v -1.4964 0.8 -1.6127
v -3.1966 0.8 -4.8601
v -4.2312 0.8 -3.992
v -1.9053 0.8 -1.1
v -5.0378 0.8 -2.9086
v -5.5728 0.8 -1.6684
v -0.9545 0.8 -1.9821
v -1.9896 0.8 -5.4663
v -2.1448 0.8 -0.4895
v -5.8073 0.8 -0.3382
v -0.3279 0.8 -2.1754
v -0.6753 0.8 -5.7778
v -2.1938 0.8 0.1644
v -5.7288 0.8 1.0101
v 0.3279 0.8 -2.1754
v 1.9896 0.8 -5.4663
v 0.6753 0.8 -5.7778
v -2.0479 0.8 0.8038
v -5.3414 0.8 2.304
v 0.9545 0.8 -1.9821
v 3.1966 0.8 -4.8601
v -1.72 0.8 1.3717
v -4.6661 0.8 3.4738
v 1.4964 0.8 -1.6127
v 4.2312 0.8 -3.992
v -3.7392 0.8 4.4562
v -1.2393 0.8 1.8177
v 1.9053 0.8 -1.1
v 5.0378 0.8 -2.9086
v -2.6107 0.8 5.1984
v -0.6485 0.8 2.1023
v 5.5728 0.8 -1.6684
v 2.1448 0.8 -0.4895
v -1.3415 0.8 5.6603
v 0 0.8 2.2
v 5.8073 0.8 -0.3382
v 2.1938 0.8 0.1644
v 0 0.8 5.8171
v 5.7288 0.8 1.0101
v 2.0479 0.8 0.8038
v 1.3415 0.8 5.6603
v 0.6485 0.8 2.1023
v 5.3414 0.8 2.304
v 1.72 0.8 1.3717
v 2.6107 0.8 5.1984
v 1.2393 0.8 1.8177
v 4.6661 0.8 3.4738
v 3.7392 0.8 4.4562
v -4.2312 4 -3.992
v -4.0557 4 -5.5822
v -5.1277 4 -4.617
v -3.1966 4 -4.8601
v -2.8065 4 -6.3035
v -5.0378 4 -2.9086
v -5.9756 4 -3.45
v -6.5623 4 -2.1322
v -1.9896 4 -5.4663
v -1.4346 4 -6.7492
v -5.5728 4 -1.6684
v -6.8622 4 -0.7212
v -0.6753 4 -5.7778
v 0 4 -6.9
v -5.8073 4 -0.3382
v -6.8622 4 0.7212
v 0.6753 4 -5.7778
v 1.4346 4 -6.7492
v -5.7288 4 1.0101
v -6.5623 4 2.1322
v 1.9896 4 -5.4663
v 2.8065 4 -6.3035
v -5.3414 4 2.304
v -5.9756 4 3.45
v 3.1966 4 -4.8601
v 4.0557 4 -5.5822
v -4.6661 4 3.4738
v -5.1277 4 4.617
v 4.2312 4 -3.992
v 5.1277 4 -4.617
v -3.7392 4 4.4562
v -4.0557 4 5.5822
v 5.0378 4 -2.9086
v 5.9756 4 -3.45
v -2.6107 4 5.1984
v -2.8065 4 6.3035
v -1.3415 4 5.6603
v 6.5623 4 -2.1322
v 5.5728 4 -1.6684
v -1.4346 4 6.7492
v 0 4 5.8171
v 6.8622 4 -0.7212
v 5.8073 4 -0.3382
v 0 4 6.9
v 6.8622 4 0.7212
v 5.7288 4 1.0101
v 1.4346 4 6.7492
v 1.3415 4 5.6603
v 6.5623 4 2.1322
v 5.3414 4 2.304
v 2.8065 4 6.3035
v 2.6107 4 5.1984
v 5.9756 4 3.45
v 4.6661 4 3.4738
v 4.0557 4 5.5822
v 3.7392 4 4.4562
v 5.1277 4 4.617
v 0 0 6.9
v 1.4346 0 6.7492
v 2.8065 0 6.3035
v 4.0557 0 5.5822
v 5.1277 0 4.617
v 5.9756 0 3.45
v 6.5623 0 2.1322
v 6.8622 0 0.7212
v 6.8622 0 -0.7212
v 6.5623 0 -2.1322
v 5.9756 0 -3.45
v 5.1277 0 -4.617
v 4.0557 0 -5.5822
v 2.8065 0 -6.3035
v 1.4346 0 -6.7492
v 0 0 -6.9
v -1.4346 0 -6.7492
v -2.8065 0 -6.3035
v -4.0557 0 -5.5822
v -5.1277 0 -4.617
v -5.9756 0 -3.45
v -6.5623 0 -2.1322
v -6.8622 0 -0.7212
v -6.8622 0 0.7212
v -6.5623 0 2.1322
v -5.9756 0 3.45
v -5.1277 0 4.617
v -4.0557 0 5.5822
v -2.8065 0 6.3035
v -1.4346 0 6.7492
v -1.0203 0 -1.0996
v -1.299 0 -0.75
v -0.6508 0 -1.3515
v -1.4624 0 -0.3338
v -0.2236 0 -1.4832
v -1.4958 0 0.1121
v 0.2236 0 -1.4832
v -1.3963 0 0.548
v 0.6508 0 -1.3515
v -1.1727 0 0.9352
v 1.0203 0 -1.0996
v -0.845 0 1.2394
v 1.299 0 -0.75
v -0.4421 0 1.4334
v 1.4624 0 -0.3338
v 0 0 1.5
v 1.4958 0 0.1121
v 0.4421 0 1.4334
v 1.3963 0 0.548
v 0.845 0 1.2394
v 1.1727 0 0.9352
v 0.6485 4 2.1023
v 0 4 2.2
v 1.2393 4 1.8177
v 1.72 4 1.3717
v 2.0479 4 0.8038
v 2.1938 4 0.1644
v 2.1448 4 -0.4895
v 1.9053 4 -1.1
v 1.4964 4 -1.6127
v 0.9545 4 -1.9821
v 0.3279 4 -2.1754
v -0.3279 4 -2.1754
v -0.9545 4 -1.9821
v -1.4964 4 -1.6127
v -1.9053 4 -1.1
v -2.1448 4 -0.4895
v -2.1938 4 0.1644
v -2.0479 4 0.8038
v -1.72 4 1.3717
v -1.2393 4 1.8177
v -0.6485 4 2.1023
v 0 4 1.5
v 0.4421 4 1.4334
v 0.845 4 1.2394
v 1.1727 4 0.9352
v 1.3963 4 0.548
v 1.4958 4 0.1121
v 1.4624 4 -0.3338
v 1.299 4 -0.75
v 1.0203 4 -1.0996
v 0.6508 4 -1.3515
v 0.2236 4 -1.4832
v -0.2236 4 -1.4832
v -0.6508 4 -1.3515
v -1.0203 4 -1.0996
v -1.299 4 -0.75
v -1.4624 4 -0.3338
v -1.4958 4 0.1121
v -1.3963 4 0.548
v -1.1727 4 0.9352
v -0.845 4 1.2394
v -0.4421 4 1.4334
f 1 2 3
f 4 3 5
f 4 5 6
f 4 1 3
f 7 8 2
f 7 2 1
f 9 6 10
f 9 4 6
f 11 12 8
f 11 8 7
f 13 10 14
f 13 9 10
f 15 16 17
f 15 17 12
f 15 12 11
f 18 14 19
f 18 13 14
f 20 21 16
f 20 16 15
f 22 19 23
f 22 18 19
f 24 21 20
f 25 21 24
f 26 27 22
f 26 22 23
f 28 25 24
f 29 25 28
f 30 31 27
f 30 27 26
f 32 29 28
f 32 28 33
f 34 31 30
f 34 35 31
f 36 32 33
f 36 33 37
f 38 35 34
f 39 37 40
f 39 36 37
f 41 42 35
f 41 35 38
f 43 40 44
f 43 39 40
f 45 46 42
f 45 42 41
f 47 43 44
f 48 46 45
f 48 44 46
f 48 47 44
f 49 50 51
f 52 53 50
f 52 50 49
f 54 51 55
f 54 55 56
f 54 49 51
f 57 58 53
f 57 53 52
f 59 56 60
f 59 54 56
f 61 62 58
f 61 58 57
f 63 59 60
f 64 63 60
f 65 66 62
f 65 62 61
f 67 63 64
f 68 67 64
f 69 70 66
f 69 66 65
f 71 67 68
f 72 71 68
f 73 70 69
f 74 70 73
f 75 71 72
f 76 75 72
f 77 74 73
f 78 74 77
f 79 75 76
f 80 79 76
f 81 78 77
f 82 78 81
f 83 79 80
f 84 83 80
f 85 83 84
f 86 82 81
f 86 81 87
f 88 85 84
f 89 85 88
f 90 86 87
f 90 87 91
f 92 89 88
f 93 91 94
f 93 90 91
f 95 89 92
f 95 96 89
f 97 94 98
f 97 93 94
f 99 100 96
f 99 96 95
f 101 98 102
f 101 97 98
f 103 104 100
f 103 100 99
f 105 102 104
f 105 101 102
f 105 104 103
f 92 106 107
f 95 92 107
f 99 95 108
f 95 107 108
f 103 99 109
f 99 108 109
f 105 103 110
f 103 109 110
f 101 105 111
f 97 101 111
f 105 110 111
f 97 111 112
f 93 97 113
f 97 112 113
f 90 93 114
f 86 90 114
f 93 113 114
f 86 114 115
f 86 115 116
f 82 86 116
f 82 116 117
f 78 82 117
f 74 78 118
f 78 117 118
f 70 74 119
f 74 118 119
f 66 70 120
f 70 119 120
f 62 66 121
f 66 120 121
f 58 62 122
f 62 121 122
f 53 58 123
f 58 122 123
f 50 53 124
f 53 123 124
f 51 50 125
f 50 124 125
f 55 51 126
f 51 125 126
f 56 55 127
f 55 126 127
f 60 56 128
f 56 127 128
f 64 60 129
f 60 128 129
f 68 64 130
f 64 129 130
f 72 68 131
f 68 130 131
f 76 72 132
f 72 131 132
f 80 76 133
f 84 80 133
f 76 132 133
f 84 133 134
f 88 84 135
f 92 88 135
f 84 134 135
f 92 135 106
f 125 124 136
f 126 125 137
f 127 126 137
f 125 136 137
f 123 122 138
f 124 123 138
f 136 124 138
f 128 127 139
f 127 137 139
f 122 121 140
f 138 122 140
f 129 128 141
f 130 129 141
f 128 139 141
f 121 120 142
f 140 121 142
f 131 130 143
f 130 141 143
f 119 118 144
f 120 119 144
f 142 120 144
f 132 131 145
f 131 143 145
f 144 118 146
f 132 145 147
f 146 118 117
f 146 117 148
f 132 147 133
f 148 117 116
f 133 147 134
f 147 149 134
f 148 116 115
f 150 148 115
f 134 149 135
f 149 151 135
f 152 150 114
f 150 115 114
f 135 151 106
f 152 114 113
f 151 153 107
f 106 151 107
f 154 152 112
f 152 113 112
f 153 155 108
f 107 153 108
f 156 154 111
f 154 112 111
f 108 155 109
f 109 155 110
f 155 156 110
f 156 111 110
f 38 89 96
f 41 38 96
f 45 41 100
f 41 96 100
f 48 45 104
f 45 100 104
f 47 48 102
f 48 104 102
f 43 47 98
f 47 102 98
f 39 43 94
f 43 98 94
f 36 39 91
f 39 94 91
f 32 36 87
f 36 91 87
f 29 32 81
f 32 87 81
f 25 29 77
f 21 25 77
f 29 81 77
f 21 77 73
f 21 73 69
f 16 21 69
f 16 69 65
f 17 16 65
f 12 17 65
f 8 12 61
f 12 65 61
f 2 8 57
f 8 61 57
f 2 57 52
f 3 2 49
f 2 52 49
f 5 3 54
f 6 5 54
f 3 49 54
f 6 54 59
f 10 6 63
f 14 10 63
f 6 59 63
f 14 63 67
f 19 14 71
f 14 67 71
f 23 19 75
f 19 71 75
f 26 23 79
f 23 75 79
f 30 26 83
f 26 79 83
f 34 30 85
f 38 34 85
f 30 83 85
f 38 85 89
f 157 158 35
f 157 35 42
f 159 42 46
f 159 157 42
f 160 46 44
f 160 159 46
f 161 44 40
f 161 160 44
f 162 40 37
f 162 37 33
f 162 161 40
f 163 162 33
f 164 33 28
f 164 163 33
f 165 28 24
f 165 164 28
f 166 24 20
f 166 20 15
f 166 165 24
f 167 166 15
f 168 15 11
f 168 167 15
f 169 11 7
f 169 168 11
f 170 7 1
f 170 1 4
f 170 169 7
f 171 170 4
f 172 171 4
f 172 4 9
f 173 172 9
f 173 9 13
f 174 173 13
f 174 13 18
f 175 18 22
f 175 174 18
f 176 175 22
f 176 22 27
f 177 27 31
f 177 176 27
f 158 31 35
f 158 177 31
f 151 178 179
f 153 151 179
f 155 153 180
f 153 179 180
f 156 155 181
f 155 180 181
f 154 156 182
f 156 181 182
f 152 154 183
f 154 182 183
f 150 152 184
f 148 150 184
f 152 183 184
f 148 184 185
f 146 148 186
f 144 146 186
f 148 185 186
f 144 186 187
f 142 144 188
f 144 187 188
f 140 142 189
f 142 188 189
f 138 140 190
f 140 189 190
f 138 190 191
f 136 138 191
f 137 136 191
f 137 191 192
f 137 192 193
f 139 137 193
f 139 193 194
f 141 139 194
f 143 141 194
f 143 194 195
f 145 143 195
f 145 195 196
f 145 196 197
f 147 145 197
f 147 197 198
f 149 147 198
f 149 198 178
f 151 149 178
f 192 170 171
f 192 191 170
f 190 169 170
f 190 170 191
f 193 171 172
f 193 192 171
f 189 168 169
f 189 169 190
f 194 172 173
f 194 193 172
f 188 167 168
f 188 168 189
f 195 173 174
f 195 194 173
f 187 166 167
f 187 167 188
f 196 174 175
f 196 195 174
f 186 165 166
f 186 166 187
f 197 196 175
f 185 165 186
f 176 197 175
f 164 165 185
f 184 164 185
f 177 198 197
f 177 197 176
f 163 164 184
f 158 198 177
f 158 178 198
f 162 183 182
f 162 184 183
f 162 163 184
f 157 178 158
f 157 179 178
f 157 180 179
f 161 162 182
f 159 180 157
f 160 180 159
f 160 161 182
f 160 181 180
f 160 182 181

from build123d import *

# Parameters (mm, degrees)
SKETCH_1_R          = 6.9
EXTRUDE_1_DEPTH     = 4
SKETCH_2_R          = 5.817135152
SKETCH_2_R_2        = 2.2
CUT_EXTRUDE_2_DEPTH = 3.2
SKETCH_3_R          = 1.5
CUT_EXTRUDE_3_DEPTH = 11.546089323


with BuildPart() as part:
    # Эскиз1 → Вытянуть1 (new body)
    with BuildSketch(Plane(origin=(0, 0, 0), x_dir=(1, 0, 0), z_dir=(0, 1, 0))):
        with Locations(Location((0, 0, 0), (0, 0, 270))):
            Circle(SKETCH_1_R)
    extrude(amount=EXTRUDE_1_DEPTH)

    # Эскиз2 → Вытянуть2 (cut)
    with BuildSketch(Plane(origin=(0, 4, 0), x_dir=(1, 0, 0), z_dir=(0, 1, 0))):
        with Locations(Location((0, 0, 0), (0, 0, 270))):
            Circle(SKETCH_2_R)
        with Locations(Location((0, 0, 0), (0, 0, 270))):
            Circle(SKETCH_2_R_2, mode=Mode.SUBTRACT)
    extrude(amount=-CUT_EXTRUDE_2_DEPTH, mode=Mode.SUBTRACT)

    # Эскиз3 → Вытянуть3 (cut, through all)
    with BuildSketch(Plane(origin=(0, 4, 0), x_dir=(1, 0, 0), z_dir=(0, 1, 0))):
        with Locations(Location((0, 0, 0), (0, 0, 270))):
            Circle(SKETCH_3_R)
    extrude(amount=-CUT_EXTRUDE_3_DEPTH, mode=Mode.SUBTRACT)


solid = part.part
